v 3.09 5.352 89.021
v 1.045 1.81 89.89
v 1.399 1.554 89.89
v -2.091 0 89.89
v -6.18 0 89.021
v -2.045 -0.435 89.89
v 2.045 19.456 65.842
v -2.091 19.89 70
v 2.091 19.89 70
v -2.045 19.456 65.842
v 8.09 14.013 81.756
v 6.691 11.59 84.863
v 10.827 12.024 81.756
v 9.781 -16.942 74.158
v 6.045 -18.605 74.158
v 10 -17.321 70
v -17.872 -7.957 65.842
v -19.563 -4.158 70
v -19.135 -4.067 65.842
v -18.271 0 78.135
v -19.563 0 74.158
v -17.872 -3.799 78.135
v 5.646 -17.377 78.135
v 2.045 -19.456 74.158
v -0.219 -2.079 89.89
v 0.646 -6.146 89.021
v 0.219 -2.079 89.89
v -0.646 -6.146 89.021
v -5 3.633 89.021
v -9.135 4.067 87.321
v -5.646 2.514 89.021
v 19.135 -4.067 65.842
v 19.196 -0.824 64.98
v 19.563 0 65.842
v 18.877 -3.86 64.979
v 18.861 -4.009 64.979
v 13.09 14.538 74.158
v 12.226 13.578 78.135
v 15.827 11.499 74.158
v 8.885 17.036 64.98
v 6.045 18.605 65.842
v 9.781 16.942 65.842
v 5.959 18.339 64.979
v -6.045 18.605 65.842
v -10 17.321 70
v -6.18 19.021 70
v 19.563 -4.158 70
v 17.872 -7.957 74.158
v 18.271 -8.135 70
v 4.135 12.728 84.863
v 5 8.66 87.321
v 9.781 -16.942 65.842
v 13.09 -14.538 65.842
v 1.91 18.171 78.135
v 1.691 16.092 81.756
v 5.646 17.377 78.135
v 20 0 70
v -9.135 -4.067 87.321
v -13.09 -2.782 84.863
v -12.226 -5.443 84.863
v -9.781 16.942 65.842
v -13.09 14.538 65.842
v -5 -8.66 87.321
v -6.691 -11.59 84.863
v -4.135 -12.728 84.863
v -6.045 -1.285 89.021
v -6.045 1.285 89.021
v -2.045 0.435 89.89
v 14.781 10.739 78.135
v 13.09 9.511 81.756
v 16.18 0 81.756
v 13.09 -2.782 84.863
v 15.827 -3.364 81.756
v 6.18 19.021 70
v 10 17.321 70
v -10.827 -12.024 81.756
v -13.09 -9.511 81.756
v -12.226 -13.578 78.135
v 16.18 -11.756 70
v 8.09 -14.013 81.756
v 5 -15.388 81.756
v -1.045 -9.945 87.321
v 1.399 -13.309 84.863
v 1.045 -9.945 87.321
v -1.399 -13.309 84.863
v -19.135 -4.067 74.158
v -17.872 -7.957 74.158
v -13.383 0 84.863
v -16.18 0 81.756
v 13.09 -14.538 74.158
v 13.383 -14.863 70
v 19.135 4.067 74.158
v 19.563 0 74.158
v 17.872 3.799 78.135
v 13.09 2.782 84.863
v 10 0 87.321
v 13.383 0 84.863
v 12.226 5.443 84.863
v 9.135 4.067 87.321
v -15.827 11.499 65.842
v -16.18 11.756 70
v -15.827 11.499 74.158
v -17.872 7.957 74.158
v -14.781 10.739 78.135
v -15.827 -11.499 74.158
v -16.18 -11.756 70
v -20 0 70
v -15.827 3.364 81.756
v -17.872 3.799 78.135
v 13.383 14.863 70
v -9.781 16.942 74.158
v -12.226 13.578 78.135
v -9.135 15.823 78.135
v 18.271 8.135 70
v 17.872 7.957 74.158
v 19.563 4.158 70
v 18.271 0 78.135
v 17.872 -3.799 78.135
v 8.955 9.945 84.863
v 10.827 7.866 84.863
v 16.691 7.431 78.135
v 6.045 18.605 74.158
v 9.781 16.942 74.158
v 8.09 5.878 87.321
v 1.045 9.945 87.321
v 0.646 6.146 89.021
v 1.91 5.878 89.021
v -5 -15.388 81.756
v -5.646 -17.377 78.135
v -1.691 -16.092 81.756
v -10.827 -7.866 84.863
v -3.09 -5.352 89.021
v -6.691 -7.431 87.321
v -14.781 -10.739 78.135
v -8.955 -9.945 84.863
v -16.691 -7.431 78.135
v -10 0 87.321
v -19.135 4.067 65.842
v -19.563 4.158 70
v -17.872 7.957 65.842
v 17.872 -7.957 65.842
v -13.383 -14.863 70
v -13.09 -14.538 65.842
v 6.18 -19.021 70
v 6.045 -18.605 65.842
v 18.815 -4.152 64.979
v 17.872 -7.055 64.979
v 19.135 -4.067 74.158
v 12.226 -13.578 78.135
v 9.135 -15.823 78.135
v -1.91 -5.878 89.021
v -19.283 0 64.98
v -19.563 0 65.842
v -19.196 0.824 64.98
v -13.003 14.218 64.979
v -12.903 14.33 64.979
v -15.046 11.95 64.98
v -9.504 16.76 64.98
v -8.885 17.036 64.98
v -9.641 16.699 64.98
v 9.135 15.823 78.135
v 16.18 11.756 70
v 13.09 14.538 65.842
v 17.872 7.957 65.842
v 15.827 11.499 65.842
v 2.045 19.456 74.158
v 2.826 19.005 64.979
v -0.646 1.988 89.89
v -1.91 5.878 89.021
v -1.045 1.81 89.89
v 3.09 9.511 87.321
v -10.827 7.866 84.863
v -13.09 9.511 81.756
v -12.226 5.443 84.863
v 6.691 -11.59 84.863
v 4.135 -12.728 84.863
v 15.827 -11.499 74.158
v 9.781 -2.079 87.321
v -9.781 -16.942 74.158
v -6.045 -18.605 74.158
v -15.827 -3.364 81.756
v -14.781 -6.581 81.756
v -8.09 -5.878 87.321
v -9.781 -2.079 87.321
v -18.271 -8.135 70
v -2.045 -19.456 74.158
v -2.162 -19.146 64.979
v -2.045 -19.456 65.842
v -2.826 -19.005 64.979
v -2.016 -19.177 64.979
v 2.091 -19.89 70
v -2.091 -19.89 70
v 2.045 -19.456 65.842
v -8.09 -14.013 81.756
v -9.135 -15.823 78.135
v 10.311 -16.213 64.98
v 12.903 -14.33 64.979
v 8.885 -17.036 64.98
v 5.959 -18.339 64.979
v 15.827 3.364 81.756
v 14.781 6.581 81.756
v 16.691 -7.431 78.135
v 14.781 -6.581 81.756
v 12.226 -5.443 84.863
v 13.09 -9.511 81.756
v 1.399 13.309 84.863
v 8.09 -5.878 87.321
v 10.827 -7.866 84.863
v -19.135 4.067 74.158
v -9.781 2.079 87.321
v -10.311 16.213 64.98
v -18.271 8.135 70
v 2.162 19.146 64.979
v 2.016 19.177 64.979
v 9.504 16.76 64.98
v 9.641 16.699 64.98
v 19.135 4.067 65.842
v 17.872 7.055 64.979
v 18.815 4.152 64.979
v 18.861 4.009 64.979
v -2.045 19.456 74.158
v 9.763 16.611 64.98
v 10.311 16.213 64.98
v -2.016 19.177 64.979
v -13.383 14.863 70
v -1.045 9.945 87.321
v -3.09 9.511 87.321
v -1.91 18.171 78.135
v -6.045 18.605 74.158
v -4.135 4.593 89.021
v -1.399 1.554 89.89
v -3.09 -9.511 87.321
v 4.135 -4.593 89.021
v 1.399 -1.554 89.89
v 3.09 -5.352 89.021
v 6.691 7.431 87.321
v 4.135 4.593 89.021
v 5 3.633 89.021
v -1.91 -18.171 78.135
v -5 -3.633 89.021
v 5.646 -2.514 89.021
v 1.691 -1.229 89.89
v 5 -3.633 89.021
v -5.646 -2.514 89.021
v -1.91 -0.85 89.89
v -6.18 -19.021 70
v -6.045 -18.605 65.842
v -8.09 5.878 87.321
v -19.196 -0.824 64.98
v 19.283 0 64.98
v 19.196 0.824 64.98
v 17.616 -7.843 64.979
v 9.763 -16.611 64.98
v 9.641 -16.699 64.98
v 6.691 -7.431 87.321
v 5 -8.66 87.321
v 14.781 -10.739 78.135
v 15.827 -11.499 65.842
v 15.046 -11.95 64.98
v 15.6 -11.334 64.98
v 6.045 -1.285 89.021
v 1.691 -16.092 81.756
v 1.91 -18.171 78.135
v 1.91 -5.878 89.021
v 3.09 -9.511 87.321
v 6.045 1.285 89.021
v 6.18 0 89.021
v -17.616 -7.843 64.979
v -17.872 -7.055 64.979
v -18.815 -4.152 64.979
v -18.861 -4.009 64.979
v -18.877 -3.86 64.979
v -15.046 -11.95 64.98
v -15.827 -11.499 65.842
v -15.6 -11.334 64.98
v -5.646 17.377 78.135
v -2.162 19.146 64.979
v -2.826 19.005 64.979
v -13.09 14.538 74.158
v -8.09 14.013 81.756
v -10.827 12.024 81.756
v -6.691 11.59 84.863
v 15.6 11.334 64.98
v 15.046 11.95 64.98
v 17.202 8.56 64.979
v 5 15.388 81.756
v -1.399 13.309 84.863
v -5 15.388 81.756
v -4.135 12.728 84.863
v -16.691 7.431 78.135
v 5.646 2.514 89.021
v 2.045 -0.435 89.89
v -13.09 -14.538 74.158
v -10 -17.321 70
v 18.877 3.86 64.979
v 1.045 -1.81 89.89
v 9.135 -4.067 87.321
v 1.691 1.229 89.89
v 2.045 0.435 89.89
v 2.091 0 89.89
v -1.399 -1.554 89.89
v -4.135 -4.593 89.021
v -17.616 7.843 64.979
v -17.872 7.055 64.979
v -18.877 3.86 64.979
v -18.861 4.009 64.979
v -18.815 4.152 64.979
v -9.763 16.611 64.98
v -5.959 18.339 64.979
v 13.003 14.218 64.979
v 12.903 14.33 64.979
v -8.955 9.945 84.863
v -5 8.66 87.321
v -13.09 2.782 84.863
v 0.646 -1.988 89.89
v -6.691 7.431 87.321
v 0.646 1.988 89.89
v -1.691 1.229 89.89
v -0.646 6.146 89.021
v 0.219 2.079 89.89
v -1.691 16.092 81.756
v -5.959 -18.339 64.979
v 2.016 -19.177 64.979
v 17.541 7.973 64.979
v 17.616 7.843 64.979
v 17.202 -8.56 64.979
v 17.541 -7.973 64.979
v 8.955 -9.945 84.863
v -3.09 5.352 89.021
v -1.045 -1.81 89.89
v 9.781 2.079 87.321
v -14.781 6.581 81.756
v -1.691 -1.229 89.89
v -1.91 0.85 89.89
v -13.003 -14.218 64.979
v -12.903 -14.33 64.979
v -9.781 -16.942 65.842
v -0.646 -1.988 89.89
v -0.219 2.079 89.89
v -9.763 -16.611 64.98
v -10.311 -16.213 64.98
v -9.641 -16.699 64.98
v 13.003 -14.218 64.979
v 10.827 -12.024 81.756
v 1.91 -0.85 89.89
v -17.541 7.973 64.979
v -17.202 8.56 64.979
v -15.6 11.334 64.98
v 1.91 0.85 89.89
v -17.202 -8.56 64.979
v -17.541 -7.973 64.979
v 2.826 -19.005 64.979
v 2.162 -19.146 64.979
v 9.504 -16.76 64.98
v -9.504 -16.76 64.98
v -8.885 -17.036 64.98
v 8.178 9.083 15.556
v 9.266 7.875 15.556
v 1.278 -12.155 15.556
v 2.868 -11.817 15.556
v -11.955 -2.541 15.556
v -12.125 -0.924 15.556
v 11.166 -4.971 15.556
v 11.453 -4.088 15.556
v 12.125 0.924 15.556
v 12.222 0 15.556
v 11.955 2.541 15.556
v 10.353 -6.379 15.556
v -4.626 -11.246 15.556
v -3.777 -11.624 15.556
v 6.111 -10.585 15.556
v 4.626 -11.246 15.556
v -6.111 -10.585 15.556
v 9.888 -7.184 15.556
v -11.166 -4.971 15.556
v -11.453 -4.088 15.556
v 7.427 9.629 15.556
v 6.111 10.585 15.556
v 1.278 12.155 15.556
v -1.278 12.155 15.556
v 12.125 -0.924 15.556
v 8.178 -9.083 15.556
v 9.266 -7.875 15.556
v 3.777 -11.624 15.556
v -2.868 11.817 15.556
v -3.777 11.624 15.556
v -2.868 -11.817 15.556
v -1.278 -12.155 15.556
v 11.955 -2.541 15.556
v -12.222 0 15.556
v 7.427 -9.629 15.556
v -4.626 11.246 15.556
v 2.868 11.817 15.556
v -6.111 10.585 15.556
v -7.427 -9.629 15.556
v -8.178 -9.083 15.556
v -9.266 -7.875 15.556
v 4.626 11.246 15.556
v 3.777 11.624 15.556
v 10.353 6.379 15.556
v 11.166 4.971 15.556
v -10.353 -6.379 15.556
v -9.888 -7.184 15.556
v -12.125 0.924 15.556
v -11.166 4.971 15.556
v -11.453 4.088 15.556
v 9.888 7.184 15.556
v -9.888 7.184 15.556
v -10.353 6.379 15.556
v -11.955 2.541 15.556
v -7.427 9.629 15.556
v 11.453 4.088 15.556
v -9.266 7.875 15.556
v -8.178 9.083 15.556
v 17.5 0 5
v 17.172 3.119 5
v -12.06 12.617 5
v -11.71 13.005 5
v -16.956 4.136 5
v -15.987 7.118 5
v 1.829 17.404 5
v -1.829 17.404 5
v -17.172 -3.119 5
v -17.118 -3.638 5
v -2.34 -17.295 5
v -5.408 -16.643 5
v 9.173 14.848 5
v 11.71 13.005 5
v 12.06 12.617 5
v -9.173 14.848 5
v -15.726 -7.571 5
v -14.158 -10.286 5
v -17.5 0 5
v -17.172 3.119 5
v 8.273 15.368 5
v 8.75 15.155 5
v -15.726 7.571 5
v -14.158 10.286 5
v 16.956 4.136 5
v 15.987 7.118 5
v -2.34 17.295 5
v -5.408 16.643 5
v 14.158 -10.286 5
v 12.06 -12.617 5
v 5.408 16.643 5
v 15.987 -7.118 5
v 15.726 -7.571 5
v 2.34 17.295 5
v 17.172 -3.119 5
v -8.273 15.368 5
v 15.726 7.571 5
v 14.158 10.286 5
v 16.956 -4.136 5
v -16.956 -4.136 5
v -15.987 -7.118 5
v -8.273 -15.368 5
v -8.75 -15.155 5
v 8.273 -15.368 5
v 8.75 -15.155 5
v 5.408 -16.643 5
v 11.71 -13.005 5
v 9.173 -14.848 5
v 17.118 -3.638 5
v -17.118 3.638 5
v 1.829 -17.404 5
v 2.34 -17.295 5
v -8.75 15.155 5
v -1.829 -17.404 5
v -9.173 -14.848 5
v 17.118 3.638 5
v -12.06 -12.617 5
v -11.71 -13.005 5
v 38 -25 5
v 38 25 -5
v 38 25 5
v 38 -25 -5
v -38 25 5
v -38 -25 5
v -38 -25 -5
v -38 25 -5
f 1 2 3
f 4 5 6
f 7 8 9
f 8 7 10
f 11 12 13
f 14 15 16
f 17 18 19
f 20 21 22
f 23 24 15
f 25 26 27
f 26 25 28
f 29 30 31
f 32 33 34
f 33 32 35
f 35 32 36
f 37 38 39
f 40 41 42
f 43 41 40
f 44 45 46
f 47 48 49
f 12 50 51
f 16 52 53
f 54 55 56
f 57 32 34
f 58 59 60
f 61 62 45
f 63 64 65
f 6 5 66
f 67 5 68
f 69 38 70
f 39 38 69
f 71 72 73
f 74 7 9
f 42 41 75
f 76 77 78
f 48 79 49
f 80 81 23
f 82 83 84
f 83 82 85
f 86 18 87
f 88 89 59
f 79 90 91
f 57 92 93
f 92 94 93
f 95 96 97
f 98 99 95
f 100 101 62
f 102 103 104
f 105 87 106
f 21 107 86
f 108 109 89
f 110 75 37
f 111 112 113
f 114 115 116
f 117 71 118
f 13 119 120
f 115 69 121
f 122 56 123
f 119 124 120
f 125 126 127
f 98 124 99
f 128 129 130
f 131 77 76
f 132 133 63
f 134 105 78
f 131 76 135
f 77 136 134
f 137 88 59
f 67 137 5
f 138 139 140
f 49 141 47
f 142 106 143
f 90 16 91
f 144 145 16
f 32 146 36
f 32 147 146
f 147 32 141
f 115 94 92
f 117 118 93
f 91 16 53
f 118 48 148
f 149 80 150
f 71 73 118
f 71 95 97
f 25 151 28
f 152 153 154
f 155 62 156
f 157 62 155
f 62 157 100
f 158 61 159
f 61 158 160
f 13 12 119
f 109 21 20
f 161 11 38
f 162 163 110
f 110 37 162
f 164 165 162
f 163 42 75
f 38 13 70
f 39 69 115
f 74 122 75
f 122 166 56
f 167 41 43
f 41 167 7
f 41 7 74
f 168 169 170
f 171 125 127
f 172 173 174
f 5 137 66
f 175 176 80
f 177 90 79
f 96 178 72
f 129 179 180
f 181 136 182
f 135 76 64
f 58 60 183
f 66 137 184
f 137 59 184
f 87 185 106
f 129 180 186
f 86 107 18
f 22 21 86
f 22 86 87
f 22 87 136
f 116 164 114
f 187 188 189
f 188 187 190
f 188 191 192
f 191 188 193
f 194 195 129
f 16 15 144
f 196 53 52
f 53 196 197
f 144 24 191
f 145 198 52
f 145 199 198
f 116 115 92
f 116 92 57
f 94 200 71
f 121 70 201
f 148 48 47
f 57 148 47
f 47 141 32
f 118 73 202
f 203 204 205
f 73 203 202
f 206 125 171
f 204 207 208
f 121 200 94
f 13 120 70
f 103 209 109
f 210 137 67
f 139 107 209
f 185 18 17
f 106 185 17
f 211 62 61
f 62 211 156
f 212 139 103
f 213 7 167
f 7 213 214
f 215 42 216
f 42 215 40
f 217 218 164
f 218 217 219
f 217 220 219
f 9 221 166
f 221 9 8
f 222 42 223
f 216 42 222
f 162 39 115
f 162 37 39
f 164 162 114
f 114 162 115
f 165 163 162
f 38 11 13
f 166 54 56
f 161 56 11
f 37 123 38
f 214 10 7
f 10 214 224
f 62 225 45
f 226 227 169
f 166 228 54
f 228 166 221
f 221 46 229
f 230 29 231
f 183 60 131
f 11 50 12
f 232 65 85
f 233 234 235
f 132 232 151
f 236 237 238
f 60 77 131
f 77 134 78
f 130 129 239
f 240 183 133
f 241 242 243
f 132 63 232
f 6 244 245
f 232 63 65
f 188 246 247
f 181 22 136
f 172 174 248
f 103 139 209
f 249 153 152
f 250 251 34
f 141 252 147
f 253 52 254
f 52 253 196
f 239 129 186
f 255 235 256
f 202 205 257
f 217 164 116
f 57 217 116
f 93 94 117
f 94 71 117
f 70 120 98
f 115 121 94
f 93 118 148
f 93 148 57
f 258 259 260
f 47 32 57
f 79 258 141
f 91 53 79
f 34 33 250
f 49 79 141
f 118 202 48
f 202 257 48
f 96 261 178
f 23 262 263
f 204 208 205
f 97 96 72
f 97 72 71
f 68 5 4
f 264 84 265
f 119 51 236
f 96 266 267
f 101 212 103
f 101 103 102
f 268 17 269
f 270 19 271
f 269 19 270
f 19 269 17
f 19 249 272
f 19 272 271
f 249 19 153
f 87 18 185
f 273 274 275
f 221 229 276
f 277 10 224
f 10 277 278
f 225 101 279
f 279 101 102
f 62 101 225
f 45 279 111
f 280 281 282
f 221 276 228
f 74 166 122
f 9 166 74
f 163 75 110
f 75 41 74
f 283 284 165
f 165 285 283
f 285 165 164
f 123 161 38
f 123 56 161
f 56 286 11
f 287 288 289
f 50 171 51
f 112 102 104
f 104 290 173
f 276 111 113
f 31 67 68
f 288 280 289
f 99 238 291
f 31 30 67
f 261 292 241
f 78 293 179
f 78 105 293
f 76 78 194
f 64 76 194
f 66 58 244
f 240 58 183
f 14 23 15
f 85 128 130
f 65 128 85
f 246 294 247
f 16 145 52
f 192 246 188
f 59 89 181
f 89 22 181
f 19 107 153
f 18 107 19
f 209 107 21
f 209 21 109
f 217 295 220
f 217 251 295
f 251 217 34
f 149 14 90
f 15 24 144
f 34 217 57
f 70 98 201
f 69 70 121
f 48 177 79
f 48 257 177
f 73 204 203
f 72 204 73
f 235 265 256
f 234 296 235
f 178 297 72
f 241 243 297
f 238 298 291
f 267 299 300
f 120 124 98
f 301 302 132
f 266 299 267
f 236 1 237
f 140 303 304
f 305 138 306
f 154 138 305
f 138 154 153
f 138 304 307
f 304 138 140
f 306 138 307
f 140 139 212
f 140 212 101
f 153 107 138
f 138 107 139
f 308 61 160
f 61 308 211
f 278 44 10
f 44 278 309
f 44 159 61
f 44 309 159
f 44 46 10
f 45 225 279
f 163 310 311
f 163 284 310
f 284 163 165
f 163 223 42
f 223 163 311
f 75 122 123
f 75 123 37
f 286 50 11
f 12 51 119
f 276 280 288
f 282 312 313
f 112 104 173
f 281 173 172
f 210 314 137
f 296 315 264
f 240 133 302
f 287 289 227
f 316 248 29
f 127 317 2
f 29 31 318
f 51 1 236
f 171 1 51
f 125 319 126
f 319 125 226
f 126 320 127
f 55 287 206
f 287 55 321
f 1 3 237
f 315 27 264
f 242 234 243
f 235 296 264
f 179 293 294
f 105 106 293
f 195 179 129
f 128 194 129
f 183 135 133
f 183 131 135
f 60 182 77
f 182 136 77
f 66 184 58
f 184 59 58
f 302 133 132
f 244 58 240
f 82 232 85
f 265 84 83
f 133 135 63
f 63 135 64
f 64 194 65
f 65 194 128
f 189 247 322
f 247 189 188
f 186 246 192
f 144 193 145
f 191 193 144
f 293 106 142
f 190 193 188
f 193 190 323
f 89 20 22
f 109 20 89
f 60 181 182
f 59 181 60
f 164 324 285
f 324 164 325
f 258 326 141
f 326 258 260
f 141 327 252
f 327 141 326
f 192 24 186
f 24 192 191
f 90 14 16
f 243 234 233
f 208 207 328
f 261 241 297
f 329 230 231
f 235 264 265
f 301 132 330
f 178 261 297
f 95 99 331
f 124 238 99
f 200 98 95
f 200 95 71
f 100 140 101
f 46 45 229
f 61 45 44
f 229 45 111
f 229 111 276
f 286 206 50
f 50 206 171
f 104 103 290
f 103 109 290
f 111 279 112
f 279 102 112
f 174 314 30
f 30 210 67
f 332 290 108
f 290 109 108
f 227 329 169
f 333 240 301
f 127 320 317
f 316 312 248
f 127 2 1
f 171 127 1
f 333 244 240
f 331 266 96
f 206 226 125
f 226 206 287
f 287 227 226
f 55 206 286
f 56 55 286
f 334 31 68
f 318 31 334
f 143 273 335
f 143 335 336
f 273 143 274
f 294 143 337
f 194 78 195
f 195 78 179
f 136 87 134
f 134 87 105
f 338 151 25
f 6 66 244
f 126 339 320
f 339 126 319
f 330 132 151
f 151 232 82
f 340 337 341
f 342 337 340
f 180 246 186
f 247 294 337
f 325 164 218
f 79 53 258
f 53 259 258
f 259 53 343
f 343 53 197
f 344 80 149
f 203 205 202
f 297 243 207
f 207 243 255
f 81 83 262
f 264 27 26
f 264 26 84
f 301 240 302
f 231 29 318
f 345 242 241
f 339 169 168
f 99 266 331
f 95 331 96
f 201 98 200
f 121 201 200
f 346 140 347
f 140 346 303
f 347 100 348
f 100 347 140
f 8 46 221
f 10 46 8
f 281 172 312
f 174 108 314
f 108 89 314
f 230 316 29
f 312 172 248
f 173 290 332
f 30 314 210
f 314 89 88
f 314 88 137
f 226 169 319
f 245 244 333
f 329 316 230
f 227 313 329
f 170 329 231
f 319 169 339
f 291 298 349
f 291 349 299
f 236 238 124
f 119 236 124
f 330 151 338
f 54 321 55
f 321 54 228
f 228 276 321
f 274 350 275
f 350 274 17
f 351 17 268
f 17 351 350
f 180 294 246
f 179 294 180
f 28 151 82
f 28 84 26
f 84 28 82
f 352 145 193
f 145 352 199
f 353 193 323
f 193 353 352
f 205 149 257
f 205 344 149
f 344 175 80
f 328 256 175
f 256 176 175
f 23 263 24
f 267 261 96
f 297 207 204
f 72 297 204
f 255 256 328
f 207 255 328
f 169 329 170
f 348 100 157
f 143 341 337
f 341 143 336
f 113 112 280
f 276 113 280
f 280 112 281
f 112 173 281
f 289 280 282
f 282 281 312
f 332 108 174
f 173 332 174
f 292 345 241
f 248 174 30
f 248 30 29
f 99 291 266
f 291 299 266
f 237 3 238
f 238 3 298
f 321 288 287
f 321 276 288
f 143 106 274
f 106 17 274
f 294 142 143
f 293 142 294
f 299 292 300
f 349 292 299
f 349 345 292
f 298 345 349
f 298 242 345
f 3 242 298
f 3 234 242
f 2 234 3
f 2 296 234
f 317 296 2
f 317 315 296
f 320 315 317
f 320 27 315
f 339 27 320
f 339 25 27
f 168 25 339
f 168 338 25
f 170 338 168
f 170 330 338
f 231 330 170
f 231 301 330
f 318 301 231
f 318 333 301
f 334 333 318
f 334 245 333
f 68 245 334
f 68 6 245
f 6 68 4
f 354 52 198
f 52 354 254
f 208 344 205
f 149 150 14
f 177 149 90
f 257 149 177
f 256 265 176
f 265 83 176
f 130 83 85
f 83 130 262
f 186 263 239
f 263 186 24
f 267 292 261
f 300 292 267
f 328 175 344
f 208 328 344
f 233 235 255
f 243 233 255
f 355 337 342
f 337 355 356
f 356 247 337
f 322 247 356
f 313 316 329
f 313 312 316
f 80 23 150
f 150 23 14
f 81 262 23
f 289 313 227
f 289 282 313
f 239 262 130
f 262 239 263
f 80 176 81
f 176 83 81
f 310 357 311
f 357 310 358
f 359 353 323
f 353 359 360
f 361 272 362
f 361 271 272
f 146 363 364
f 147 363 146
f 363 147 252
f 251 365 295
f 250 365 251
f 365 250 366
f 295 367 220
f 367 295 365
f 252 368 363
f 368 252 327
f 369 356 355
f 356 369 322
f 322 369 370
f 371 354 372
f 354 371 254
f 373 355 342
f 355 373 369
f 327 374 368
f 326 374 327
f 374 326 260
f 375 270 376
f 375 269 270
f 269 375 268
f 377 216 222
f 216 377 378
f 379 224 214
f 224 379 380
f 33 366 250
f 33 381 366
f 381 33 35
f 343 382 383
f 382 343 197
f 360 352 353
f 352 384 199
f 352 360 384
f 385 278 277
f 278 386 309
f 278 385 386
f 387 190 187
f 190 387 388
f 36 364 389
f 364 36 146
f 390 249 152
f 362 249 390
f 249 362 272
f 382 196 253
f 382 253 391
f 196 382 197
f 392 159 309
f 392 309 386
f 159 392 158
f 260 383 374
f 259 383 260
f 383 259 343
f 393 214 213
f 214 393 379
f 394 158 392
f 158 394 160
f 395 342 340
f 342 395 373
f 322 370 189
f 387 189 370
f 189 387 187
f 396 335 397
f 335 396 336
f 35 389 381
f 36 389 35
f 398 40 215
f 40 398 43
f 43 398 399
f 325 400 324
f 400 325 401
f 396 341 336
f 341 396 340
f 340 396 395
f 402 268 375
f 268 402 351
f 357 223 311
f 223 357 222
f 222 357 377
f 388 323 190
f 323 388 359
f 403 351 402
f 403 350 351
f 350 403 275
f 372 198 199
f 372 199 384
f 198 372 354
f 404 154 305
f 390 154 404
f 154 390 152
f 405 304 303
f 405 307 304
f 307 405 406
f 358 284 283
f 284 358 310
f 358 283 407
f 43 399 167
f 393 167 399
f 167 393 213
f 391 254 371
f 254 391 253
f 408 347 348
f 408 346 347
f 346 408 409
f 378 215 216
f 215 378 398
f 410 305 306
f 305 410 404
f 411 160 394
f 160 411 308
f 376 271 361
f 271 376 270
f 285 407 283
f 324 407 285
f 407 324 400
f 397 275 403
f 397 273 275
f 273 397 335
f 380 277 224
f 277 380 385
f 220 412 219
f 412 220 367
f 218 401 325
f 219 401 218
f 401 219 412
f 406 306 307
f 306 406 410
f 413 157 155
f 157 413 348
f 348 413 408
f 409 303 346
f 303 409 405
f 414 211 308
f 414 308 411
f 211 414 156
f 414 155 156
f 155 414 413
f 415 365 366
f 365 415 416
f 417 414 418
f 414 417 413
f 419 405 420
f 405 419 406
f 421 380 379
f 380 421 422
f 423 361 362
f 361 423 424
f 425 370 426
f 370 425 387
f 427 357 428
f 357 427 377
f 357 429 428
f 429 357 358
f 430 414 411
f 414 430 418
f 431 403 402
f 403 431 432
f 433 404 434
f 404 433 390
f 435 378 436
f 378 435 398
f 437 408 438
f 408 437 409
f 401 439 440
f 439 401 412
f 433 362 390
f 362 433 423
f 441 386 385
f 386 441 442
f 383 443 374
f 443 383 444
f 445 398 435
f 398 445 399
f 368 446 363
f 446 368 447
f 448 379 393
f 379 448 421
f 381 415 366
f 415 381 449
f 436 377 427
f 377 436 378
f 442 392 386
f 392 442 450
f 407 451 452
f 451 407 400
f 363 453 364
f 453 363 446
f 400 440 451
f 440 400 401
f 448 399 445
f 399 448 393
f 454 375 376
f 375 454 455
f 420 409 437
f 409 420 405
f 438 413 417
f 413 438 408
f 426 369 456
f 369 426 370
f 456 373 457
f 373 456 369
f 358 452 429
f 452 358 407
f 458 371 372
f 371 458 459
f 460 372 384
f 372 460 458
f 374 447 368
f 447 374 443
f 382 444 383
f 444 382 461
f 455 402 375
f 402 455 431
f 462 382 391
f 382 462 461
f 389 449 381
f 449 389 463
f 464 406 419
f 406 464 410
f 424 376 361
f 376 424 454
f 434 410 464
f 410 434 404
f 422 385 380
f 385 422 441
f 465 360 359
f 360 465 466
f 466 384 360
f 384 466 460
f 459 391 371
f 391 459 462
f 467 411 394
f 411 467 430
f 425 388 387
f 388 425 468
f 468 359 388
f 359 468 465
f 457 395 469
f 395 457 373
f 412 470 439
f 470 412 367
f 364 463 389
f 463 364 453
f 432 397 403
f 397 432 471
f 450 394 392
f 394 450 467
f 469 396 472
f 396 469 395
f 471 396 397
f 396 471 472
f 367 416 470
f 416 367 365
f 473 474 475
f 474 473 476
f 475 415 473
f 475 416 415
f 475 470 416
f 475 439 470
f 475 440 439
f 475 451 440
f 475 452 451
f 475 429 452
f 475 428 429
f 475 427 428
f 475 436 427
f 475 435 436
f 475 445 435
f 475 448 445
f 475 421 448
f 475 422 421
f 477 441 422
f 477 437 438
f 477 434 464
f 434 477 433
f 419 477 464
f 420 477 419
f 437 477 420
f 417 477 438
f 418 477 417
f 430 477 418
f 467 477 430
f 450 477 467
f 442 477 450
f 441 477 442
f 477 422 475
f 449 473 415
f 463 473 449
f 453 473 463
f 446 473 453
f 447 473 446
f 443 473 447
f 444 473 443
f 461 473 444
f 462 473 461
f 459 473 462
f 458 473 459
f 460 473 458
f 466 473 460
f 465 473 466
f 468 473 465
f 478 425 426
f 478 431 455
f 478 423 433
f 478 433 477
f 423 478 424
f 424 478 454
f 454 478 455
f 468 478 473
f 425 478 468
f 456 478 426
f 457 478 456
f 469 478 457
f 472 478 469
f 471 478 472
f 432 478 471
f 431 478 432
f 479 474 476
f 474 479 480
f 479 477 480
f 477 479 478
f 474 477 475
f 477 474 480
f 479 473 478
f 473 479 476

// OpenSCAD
h_handle = 70;
r_handle = 20;
r_neck =10;
h_neck = 20;

// 3 in ~= 76 mm
// 2 in ~= 50 mm
w_stamp = 76;
h_stamp = 50;
t_stamp = 10;

module handle() {
	union() {
		translate([0,0,h_handle]) sphere(r=r_handle,center=true);
		cylinder(h=h_handle,r1=r_neck,r2=r_handle);
		cylinder(h=h_neck,r1=r_handle,r2=r_neck);

	}
}

module base() {
	cube([w_stamp,h_stamp,t_stamp],center=true);
}

union() {
	base();
	handle();
}
